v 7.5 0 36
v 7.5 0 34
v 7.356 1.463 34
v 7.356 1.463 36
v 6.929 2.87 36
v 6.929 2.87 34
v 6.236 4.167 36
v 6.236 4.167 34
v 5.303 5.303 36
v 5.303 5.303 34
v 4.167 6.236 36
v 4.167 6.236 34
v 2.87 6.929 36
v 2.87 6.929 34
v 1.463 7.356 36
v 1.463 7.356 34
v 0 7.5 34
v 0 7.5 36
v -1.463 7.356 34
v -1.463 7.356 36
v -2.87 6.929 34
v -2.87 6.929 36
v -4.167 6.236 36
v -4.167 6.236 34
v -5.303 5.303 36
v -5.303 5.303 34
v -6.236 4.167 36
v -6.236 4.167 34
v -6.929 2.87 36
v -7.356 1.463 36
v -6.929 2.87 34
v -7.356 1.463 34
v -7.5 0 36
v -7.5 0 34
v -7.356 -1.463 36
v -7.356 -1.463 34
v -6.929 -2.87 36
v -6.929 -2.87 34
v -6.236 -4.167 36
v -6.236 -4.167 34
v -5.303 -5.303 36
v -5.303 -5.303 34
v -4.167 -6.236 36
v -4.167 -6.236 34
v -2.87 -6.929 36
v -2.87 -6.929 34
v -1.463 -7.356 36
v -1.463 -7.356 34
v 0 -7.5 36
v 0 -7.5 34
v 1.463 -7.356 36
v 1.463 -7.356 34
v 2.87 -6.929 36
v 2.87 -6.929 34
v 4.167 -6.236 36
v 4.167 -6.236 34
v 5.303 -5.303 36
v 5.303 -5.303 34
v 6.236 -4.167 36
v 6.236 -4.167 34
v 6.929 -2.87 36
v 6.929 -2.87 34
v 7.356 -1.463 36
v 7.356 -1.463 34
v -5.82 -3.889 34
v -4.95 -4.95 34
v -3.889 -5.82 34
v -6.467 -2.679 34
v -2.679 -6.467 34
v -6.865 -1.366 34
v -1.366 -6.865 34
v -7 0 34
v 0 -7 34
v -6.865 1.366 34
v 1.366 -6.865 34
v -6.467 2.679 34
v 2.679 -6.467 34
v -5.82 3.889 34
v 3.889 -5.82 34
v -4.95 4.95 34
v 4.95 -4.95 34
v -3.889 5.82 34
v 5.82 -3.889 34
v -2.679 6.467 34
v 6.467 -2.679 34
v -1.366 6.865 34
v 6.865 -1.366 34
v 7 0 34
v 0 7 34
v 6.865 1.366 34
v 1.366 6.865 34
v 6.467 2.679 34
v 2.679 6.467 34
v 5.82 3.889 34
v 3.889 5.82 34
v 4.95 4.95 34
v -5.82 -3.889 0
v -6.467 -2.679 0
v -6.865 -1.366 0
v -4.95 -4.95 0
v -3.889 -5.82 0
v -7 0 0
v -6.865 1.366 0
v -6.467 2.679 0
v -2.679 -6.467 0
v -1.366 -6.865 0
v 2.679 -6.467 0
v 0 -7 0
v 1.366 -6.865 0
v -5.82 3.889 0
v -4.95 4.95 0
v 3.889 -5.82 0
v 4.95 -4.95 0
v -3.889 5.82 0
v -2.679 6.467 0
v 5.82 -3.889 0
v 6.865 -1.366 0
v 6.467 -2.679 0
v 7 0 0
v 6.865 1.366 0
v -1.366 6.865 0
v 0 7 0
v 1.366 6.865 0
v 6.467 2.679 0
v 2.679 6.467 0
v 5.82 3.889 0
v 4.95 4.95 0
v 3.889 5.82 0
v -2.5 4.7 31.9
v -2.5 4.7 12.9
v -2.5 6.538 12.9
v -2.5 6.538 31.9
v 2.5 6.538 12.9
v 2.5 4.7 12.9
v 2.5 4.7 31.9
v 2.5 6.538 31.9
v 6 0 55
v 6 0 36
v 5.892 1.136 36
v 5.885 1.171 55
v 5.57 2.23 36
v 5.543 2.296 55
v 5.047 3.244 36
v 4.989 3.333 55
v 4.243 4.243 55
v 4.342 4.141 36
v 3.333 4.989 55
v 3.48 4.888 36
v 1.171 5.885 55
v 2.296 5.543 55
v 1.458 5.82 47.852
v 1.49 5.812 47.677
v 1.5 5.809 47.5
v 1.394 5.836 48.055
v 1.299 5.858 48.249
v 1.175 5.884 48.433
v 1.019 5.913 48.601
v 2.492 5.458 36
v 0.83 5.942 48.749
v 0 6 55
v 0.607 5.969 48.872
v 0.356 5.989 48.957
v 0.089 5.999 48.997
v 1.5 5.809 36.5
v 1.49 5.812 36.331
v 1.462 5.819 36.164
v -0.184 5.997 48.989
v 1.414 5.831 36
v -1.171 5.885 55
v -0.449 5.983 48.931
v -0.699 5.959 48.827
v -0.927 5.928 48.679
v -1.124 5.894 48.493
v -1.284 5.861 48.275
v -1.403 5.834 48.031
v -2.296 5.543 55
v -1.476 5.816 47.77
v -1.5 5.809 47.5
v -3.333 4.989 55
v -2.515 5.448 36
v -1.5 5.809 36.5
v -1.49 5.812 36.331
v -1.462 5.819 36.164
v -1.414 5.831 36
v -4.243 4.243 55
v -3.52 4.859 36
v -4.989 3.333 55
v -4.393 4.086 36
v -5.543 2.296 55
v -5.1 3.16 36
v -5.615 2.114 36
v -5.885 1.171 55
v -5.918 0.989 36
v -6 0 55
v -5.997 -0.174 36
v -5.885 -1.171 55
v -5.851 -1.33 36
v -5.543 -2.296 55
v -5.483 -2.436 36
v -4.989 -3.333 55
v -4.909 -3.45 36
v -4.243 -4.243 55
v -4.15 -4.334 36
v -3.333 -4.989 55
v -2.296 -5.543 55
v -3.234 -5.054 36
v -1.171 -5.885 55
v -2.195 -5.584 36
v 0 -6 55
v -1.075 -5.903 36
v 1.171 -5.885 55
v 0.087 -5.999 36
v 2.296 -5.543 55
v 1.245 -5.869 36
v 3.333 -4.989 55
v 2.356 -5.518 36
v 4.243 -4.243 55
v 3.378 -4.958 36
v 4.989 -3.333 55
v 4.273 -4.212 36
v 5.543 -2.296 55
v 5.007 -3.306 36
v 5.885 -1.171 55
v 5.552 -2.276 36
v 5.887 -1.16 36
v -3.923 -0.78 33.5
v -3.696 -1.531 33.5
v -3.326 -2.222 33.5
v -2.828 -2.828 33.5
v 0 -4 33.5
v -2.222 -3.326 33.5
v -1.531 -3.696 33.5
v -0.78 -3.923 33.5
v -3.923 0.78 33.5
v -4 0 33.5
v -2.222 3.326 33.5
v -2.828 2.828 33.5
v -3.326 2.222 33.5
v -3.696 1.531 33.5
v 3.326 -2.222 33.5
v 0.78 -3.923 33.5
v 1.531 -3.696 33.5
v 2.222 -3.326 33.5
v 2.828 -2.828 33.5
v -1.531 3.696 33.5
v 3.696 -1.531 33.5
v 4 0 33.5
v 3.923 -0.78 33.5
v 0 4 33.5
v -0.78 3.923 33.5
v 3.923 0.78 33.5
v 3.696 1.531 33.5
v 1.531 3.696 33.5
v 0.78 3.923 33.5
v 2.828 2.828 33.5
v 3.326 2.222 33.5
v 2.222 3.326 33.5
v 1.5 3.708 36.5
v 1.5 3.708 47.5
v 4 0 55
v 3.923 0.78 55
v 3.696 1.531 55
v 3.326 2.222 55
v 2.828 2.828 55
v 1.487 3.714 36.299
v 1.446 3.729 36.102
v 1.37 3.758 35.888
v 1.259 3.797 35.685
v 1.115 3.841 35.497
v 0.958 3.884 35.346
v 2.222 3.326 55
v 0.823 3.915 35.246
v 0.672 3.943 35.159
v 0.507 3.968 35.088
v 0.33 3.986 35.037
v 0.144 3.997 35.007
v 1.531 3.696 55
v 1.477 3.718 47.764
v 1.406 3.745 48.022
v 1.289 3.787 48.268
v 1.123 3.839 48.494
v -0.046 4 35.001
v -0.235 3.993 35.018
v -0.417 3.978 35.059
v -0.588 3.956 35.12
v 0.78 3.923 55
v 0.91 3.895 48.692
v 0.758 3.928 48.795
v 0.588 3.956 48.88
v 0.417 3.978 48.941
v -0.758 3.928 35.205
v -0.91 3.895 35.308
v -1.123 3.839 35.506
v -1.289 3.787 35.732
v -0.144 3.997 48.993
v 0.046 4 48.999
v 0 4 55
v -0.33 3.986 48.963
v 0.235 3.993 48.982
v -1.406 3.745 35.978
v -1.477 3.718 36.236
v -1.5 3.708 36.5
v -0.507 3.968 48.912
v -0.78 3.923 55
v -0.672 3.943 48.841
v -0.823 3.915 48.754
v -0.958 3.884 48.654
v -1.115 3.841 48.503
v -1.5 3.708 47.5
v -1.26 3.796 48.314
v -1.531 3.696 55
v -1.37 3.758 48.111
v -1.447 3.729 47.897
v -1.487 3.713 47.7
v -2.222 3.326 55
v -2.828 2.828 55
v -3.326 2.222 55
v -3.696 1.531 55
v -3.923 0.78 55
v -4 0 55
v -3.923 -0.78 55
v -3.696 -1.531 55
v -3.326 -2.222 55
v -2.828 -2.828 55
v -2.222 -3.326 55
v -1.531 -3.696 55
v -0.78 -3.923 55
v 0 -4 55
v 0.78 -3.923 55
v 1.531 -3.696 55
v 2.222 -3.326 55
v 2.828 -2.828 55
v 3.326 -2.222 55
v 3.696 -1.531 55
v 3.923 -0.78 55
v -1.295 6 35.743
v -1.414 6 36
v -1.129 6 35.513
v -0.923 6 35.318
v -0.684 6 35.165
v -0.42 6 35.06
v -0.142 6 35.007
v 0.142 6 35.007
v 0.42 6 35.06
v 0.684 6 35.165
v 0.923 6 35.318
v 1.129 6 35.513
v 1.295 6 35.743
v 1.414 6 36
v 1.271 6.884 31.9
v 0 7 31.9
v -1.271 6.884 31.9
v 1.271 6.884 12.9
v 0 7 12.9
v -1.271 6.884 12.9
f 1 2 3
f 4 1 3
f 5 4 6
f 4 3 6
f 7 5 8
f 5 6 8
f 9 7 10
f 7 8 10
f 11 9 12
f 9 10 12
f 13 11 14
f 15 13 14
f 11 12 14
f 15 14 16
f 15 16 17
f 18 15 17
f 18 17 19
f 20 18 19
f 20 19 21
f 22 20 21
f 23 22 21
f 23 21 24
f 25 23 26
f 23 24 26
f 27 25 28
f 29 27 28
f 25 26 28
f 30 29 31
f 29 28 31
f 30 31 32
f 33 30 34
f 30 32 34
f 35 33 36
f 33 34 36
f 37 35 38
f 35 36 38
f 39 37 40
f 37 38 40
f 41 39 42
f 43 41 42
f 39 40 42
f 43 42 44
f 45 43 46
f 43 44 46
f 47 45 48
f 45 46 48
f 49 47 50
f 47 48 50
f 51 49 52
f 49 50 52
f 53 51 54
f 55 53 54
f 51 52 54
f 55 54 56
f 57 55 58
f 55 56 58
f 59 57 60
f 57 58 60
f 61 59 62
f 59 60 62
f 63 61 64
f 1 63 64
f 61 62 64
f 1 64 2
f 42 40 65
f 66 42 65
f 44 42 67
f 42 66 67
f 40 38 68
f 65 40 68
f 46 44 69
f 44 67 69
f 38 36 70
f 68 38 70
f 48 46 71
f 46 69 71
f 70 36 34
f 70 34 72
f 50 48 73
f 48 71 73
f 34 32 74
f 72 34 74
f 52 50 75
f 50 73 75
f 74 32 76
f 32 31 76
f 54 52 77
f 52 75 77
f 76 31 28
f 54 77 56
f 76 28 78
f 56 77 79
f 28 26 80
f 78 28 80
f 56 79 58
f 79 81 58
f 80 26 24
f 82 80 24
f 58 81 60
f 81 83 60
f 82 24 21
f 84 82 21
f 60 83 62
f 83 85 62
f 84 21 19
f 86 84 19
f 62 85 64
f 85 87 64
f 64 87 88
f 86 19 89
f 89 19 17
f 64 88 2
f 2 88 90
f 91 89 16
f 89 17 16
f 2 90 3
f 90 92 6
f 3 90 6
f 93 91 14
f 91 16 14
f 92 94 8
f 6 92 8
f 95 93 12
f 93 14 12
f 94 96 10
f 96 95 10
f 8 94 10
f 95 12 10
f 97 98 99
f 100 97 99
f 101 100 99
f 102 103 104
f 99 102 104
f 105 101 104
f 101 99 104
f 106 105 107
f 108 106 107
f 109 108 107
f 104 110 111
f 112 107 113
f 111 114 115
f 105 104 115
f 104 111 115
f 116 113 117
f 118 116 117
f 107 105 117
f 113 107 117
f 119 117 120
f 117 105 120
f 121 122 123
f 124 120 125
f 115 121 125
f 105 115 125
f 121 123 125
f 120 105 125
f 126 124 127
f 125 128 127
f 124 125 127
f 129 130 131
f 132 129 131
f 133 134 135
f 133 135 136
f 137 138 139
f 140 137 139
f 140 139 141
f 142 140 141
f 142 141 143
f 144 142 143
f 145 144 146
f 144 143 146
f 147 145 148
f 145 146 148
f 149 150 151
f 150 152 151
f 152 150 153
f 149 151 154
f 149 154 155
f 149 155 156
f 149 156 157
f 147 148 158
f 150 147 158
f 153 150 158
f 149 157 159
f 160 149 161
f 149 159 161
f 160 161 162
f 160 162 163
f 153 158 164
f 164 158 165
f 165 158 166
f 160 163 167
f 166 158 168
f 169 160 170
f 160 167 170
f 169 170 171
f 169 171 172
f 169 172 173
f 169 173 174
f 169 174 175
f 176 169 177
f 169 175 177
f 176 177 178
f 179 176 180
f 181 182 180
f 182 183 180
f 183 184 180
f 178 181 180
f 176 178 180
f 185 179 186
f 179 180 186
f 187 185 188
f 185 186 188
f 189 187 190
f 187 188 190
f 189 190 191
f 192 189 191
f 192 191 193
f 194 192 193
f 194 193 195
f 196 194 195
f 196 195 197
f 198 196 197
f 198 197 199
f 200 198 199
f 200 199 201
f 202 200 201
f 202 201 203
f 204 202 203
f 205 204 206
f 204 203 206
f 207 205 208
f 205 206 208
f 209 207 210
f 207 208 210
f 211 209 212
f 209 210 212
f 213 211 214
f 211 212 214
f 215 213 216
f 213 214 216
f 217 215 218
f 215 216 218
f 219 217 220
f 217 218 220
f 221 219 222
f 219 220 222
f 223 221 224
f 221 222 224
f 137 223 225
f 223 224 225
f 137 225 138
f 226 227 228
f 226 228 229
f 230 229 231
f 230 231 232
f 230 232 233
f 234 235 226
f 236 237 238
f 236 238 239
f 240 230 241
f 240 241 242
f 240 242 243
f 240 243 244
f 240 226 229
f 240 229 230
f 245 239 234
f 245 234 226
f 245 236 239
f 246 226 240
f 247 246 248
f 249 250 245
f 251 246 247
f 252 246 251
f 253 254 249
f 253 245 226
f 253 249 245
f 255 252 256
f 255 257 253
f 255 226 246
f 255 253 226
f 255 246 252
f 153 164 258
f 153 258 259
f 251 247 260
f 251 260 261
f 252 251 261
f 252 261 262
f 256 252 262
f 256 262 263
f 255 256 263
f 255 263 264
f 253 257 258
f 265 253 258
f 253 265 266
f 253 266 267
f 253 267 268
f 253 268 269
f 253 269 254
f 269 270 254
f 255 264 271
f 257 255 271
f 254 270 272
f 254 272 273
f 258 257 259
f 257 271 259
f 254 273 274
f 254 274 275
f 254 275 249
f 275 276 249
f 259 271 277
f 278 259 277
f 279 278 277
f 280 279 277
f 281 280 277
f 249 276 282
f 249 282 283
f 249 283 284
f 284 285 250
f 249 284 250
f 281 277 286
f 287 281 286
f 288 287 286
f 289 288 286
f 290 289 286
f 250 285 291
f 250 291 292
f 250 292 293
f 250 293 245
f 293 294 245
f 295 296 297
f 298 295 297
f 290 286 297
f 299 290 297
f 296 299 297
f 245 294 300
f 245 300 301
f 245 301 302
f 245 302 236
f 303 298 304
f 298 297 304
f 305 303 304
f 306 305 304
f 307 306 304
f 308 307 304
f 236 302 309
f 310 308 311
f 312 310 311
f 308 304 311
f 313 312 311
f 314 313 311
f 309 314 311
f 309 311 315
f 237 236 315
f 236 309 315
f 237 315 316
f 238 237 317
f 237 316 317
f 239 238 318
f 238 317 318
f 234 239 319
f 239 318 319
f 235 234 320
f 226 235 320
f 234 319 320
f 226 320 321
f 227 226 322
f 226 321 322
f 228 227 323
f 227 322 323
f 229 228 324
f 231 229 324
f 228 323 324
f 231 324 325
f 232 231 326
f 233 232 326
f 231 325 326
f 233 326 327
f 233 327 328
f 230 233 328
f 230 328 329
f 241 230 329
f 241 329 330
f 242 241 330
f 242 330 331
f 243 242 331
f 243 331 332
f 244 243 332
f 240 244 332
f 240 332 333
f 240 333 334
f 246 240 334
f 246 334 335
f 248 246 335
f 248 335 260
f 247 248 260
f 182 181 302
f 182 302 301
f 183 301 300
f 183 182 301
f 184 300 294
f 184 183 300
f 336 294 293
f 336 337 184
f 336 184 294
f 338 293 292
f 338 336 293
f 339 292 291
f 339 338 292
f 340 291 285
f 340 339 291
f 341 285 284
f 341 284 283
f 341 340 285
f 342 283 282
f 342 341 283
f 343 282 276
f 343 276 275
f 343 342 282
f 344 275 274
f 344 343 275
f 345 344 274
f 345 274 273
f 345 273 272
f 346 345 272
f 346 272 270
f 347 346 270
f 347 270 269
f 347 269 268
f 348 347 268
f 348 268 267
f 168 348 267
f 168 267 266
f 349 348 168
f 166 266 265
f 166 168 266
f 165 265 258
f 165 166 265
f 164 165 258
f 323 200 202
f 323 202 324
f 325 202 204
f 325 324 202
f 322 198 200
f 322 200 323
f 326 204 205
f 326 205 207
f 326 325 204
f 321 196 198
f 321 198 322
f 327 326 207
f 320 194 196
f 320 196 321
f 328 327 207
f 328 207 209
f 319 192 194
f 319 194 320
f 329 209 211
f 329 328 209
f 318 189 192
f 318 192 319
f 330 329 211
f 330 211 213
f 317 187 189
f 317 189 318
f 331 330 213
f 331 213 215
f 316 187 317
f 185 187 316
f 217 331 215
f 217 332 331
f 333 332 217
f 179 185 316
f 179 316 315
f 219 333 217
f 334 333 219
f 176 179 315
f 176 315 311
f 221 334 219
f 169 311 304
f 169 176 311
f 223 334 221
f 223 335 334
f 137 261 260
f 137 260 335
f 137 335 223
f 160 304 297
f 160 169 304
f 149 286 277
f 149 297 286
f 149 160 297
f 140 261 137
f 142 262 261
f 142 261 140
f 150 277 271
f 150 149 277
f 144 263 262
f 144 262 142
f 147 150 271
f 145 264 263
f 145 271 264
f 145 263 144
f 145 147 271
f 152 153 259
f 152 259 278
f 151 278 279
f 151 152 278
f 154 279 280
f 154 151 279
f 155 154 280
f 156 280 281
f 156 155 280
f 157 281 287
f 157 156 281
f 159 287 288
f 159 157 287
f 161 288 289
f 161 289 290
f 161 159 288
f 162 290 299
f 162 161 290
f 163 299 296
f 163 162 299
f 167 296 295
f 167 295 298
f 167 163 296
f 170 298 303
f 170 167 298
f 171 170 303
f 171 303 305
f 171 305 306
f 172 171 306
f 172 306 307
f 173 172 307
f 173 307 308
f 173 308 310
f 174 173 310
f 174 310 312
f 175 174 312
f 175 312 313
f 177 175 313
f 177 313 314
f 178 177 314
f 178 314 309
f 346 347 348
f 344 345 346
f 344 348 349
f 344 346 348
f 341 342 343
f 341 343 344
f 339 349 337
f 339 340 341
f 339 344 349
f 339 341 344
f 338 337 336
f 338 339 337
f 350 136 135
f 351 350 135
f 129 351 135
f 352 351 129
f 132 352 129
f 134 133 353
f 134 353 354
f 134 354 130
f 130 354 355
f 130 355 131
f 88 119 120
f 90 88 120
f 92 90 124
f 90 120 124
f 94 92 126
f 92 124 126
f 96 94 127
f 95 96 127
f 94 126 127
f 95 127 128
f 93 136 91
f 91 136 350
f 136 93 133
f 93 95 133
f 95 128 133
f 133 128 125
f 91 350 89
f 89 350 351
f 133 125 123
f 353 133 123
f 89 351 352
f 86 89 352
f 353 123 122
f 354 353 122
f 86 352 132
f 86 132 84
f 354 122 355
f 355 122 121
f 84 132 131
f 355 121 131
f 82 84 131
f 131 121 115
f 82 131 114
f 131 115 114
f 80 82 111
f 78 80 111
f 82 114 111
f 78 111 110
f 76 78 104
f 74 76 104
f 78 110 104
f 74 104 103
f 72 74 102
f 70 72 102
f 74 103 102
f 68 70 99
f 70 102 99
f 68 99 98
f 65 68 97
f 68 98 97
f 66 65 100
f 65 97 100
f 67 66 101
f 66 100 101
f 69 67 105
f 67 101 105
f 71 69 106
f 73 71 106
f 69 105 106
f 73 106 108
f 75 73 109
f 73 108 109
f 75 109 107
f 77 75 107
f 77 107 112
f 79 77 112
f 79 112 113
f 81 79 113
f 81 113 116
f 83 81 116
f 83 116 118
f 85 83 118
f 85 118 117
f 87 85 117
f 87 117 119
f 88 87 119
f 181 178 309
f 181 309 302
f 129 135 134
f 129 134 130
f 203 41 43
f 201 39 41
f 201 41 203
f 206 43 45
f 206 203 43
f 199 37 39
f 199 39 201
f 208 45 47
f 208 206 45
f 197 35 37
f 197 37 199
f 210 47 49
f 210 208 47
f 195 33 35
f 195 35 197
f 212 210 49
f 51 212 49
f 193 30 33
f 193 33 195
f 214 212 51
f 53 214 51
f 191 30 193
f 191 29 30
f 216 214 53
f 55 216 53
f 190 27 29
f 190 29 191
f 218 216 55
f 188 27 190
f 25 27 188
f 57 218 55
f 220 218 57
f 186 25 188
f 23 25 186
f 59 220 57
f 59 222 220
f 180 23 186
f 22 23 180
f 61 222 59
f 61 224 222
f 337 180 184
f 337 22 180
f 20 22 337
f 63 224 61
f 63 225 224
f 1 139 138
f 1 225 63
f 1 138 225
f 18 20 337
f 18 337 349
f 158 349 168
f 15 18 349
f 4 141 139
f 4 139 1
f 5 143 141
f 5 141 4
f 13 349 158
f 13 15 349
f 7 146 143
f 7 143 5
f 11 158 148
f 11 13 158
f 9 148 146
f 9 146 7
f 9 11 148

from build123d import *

# Parameters (mm, degrees)
SKETCH1_R           = 7
BOSS_EXTRUDE1_DEPTH = 34
SKETCH2_R           = 7.5
BOSS_EXTRUDE2_DEPTH = 2
SKETCH3_R           = 6
BOSS_EXTRUDE3_DEPTH = 19
SKETCH4_R           = 4
CUT_EXTRUDE1_DEPTH  = 21.5
CUT_EXTRUDE2_REACH  = 15.5
SKETCH6_W           = 5
SKETCH6_H           = 4.6
CUT_EXTRUDE3_DEPTH  = 19


with BuildPart() as part:
    # Sketch1 → Boss-Extrude1 (new body)
    with BuildSketch(Plane.XY):
        Circle(SKETCH1_R)
    extrude(amount=BOSS_EXTRUDE1_DEPTH)

    # Sketch2 → Boss-Extrude2 (add)
    with BuildSketch(Plane.XY.offset(34)):
        Circle(SKETCH2_R)
    extrude(amount=BOSS_EXTRUDE2_DEPTH)

    # Sketch3 → Boss-Extrude3 (add)
    with BuildSketch(Plane.XY.offset(36)):
        Circle(SKETCH3_R)
    extrude(amount=BOSS_EXTRUDE3_DEPTH)

    # Sketch4 → Cut-Extrude1 (cut)
    with BuildSketch(Plane.XY.offset(55)):
        Circle(SKETCH4_R)
    extrude(amount=-CUT_EXTRUDE1_DEPTH, mode=Mode.SUBTRACT)

    # Sketch5 → Cut-Extrude2 (cut, up to next)
    with BuildSketch(Plane(origin=(0, 6, 0), x_dir=(1, 0, 0), z_dir=(0, 1, 0)), mode=Mode.PRIVATE) as cut_extrude2_sk1:
        with BuildLine():
            Line((-1.5, -47.5), (-1.5, -36.5))
            ThreePointArc((-1.5, -36.5), (0, -35), (1.5, -36.5))
            Line((1.5, -36.5), (1.5, -47.5))
            ThreePointArc((1.5, -47.5), (0, -49), (-1.5, -47.5))
        make_face()
    cut_extrude2_tool1 = extrude(cut_extrude2_sk1.sketch, amount=-CUT_EXTRUDE2_REACH, mode=Mode.PRIVATE) & part.part
    add(cut_extrude2_tool1.solids().sort_by_distance((0, 6, 42))[0], mode=Mode.SUBTRACT)

    # Sketch6 → Cut-Extrude3 (cut)
    with BuildSketch(Plane(origin=(0, 0, 31.9), x_dir=(-1, 0, 0), z_dir=(0, 0, -1))):
        with Locations((0, 7)):
            Rectangle(SKETCH6_W, SKETCH6_H)
    extrude(amount=CUT_EXTRUDE3_DEPTH, mode=Mode.SUBTRACT)


solid = part.part
